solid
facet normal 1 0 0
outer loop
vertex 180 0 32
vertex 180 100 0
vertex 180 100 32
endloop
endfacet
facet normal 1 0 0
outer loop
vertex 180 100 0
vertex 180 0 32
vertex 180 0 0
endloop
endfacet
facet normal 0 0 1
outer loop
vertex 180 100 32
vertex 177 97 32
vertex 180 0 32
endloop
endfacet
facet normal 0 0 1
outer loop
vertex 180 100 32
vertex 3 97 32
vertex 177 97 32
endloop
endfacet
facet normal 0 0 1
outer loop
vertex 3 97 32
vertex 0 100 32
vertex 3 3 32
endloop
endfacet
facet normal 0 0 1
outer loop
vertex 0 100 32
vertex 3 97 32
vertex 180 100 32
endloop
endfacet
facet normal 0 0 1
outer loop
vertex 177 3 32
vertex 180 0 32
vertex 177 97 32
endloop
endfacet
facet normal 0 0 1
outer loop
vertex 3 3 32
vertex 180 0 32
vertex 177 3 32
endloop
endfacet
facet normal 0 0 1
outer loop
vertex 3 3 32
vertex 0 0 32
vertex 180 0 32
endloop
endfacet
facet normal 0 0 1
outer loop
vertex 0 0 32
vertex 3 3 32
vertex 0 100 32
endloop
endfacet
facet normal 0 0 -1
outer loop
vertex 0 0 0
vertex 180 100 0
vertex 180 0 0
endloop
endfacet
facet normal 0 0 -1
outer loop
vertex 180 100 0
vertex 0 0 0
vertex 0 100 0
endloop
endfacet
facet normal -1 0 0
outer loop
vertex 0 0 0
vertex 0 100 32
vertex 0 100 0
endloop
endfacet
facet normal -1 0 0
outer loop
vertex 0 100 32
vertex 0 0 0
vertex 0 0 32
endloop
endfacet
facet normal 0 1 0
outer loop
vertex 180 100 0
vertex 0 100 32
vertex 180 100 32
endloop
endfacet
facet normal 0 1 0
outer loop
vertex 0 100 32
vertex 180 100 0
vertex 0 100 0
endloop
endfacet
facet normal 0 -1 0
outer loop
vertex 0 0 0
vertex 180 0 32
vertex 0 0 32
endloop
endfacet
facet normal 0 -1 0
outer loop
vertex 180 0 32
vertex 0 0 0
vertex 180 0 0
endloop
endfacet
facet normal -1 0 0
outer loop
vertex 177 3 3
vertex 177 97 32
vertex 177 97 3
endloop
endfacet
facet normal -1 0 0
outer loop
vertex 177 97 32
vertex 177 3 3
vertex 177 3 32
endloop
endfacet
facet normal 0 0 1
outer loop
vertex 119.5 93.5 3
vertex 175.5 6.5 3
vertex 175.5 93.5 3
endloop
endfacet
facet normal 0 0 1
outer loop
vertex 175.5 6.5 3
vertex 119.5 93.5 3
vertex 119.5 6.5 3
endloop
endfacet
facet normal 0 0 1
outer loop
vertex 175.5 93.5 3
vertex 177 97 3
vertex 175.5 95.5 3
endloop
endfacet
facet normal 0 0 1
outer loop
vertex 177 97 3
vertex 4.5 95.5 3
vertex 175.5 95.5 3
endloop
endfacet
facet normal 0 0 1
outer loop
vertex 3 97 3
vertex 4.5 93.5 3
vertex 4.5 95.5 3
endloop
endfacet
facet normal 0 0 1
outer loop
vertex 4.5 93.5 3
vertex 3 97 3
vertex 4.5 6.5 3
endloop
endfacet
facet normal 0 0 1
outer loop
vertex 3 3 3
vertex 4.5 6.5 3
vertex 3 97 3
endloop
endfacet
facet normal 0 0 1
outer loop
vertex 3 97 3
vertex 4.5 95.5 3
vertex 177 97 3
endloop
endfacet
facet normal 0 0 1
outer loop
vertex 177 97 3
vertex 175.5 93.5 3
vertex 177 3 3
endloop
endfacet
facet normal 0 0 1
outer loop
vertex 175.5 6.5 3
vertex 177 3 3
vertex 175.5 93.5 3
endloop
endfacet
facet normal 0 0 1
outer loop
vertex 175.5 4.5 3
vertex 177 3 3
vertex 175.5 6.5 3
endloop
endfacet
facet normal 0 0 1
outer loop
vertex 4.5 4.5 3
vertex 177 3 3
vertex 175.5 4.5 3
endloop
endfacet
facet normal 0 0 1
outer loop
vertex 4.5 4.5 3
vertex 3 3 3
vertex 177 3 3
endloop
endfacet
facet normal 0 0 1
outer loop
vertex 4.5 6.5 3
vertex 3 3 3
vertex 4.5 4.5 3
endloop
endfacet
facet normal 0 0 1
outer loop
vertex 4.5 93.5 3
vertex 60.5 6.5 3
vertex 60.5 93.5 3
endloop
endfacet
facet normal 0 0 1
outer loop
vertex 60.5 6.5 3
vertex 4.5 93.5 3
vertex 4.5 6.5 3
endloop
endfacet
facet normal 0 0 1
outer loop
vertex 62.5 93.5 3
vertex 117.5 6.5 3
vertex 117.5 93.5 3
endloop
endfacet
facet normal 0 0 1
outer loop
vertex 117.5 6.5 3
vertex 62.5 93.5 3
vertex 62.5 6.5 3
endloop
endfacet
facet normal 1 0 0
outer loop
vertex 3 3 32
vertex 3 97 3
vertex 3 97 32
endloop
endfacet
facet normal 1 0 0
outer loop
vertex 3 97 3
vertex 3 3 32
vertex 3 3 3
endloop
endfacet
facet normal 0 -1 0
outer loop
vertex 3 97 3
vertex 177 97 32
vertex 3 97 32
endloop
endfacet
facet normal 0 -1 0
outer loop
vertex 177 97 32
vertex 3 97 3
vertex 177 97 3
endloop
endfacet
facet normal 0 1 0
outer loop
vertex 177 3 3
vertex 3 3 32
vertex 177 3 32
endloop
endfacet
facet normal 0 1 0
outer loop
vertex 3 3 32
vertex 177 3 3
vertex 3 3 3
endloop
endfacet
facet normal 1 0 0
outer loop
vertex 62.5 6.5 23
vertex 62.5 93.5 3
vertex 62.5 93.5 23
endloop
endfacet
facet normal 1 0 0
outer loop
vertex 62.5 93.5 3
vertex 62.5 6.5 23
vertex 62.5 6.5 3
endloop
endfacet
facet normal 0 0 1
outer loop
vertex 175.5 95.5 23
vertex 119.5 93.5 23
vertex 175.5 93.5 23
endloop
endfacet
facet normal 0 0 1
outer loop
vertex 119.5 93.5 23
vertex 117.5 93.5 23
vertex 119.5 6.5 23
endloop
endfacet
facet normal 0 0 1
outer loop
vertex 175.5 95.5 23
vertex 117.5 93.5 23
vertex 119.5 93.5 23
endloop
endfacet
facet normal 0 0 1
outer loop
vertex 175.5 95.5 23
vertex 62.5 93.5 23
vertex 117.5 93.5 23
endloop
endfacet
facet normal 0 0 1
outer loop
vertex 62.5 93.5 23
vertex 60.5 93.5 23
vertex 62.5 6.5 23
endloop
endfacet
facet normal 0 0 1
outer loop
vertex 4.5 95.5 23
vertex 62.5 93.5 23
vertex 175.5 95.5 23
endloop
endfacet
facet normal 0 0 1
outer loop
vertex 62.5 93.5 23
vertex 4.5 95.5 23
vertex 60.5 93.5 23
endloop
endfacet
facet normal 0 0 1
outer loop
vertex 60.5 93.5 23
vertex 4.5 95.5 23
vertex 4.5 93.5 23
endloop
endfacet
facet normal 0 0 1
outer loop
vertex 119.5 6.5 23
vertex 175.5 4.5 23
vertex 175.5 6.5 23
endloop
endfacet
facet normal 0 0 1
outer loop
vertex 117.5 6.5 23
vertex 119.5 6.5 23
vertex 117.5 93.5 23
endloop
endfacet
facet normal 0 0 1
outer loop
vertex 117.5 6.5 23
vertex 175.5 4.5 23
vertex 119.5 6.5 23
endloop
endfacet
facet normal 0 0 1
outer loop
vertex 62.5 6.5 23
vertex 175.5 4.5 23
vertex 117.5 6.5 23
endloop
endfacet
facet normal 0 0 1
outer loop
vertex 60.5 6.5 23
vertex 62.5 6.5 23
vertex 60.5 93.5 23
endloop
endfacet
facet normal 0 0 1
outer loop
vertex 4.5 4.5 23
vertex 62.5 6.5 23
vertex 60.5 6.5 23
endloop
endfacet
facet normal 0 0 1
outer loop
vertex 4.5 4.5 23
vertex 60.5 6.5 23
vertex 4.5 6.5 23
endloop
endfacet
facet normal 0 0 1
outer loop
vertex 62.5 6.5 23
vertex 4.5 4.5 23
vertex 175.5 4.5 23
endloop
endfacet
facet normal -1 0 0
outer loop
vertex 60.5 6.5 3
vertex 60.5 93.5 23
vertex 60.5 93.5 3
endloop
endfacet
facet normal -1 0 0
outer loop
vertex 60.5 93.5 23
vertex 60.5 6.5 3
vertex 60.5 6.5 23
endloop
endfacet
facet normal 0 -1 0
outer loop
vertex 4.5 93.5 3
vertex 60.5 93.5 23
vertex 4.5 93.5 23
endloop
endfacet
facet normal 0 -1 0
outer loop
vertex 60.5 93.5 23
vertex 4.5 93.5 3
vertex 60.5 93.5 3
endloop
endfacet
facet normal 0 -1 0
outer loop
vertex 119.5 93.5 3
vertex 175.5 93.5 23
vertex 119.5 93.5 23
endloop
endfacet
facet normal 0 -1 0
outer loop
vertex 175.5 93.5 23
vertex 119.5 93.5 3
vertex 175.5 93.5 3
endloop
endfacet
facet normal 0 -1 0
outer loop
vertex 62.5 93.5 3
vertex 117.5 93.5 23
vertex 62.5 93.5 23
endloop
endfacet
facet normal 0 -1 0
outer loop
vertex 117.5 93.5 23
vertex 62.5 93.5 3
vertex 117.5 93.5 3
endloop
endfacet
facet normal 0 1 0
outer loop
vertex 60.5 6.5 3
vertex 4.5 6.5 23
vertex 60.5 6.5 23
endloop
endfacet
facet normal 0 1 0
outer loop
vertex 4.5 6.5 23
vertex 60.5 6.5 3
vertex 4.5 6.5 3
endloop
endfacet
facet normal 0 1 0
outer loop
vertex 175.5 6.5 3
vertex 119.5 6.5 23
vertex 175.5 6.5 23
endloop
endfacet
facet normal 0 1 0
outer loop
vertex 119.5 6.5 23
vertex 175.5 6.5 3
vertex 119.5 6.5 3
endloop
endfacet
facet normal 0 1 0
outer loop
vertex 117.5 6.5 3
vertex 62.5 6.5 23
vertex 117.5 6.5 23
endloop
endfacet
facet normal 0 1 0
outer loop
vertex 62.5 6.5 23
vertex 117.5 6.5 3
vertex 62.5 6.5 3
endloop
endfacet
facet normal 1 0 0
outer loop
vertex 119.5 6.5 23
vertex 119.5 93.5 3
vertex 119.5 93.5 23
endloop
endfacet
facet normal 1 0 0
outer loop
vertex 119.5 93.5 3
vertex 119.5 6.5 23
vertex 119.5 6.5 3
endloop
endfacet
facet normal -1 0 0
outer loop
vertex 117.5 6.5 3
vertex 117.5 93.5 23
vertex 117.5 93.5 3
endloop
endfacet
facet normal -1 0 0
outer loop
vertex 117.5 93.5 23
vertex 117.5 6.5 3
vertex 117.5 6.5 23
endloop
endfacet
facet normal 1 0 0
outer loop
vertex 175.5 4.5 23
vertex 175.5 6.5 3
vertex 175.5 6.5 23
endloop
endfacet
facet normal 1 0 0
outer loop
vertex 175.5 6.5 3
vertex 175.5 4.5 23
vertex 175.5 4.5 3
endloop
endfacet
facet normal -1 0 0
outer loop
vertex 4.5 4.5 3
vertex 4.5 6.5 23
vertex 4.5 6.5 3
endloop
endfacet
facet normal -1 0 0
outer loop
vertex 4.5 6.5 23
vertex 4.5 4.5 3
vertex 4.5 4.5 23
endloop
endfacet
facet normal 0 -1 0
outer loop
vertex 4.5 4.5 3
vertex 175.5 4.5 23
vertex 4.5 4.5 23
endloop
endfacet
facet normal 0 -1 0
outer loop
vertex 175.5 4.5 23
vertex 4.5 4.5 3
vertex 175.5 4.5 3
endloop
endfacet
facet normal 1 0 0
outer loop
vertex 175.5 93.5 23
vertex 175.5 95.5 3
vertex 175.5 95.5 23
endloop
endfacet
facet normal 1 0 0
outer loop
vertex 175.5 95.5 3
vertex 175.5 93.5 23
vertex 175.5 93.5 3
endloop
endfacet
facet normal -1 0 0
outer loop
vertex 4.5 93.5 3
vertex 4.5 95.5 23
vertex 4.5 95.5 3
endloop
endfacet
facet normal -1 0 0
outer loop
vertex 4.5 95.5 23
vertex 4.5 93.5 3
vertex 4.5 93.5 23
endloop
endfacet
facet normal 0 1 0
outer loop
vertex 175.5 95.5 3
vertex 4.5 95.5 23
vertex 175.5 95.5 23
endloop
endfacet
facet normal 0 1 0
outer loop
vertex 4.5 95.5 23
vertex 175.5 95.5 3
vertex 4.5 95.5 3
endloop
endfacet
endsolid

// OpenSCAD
// Original Stackline desk-only design study. SYNTHETIC planning inputs.
// No toolpaths, process settings, material qualification, or fabrication claim.
part = "assembly";
width = 180;
depth = 100;
height = 32;
wall = 3;
floor = 3;
clearance = 1.5;
insert_height = 20;
rib = 2;

assert(width > 2*wall + 2*clearance + 6*rib && width <= 400);
assert(depth > 2*wall + 2*clearance + 2*rib && depth <= 300);
assert(wall >= 2 && floor >= 2 && clearance >= 0.5);
assert(height > floor && height <= 100);
assert(insert_height > 0 && insert_height <= height-floor && rib >= 1);
assert(part == "assembly" || part == "tray" || part == "insert");

iw = width - 2*wall - 2*clearance;
id = depth - 2*wall - 2*clearance;

module tray() {
    difference() {
        cube([width, depth, height]);
        translate([wall, wall, floor])
            cube([width-2*wall, depth-2*wall, height]);
    }
}

module insert() {
    union() {
        cube([iw, rib, insert_height]);
        translate([0, id-rib, 0]) cube([iw, rib, insert_height]);
        for (fraction = [1/3, 2/3])
            translate([iw*fraction-rib/2, rib, 0])
                cube([rib, id-2*rib, insert_height]);
    }
}

if (part == "tray") tray();
if (part == "insert") insert();
if (part == "assembly") {
    color([0.75, 0.79, 0.80]) tray();
    color([0.23, 0.49, 0.48])
        translate([wall+clearance, wall+clearance, floor]) insert();
}
